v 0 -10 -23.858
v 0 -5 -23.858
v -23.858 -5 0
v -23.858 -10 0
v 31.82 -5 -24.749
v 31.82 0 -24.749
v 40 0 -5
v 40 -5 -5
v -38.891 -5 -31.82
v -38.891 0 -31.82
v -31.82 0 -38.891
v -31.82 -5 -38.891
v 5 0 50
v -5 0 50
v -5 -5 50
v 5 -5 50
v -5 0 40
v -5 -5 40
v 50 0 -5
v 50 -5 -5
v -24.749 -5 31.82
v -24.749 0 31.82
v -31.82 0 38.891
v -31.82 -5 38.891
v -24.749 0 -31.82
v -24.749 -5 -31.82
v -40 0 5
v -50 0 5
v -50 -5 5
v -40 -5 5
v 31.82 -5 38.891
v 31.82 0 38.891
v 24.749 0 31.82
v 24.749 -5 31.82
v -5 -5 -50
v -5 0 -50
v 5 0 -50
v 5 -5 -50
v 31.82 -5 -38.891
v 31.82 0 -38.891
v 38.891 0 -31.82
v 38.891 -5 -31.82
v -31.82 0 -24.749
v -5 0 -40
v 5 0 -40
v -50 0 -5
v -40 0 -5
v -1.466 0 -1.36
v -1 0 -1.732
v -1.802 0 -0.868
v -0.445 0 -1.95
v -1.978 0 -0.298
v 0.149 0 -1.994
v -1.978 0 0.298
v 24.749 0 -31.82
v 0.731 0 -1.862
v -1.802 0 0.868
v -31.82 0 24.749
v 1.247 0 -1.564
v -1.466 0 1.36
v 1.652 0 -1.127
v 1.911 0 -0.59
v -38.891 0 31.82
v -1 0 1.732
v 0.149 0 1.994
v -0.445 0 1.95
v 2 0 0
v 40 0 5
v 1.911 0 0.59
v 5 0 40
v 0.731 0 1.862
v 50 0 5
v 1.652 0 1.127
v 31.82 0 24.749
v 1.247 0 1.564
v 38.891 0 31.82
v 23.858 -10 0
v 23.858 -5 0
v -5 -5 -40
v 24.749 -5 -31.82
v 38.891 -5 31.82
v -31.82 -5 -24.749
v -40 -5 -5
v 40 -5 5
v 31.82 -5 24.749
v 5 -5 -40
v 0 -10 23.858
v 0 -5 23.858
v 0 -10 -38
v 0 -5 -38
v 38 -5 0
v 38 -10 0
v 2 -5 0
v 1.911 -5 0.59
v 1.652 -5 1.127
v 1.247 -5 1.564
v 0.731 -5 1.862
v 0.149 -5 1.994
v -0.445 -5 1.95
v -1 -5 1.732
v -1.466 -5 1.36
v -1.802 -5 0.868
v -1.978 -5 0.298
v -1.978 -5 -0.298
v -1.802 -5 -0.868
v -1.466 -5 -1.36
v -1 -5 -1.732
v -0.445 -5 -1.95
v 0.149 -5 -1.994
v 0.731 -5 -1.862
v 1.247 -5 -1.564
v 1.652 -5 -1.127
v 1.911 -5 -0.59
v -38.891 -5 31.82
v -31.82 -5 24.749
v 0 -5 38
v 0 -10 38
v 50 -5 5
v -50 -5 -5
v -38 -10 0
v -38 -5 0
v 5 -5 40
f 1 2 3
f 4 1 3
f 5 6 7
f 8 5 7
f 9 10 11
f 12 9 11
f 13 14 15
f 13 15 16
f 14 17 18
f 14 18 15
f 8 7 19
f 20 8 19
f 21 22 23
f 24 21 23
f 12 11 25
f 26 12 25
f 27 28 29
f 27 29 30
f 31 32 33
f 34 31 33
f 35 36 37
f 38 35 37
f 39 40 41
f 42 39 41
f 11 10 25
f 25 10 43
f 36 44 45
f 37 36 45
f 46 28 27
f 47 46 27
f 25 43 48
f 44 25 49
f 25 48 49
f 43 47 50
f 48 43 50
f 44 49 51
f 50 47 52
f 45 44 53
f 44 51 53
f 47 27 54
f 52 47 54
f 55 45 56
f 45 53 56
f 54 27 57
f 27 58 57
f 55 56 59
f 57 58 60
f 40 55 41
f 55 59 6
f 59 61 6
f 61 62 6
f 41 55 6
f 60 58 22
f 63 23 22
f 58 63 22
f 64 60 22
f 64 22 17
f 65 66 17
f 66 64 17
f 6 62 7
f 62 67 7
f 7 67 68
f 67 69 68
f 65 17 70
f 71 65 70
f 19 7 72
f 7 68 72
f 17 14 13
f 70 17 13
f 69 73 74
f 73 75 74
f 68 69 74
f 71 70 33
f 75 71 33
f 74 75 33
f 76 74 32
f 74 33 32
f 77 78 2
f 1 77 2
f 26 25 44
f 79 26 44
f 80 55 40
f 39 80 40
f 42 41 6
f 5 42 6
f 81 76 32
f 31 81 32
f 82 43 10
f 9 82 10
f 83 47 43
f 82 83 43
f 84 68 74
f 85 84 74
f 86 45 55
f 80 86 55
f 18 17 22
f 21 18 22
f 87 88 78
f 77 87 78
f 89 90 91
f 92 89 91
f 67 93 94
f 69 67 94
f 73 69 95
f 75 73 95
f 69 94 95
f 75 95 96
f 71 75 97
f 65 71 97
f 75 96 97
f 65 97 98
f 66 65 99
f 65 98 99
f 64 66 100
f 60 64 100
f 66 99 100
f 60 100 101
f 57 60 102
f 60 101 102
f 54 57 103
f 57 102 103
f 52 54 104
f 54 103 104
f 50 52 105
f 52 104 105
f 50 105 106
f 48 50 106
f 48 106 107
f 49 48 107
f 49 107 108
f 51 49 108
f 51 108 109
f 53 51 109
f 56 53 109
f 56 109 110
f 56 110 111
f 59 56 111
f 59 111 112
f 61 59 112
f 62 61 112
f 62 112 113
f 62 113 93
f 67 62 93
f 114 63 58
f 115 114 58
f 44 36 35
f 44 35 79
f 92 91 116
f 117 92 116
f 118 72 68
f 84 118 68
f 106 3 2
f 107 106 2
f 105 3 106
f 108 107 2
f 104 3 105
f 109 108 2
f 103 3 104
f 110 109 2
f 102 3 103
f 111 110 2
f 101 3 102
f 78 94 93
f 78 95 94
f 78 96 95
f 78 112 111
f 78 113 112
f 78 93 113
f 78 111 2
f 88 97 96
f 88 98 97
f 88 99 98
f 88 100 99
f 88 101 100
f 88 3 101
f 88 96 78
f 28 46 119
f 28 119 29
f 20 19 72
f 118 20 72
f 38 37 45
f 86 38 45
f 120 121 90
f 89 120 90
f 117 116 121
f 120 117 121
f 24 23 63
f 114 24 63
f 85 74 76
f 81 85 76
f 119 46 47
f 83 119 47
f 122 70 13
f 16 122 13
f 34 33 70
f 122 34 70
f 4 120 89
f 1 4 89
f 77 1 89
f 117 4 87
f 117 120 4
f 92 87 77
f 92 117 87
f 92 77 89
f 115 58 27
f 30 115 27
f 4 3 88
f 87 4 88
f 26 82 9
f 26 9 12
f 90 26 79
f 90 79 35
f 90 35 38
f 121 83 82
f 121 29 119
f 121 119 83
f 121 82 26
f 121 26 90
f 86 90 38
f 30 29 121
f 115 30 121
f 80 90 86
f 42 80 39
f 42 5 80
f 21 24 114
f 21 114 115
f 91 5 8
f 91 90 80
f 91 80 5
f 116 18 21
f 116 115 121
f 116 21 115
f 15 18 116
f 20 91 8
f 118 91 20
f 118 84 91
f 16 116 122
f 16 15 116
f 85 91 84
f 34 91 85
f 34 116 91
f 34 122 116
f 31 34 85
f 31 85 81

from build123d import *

# Parameters (mm, degrees)
F0_W     = 10
F0_H     = 10
F1_DEPTH = 5
F3_DEPTH = 5
F2_R     = 2
F4_DEPTH = 25


with BuildPart() as f1:
    # F0 (on Front) → F1 (new body)
    with BuildSketch(Plane.XZ):
        Polygon((-24.7487373415, -31.8198051534), (-5, -40), (-5, -12.0710678119), align=None)
        Polygon((-24.7487373415, 31.8198051534), (-5, 12.0710678119), (-5, 40), align=None)
        Polygon((5, 40), (5, 12.0710678119), (24.7487373415, 31.8198051534), align=None)
        Polygon((-31.8198051534, -38.8908729653), (-24.7487373415, -31.8198051534), (-31.8198051534, -24.7487373415), (-38.8908729653, -31.8198051534), align=None)
        Polygon((24.7487373415, 31.8198051534), (31.8198051534, 24.7487373415), (38.8908729653, 31.8198051534), (31.8198051534, 38.8908729653), align=None)
        Polygon((5, -12.0710678119), (5, -40), (24.7487373415, -31.8198051534), align=None)
        Polygon((31.8198051534, -24.7487373415), (24.7487373415, -31.8198051534), (31.8198051534, -38.8908729653), (38.8908729653, -31.8198051534), align=None)
        Polygon((-40, -5), (-31.8198051534, -24.7487373415), (-12.0710678119, -5), align=None)
        Polygon((-12.0710678119, 5), (-5, 5), (-5, 12.0710678119), (-24.7487373415, 31.8198051534), (-31.8198051534, 24.7487373415), align=None)
        Polygon((-38.8908729653, 31.8198051534), (-31.8198051534, 24.7487373415), (-24.7487373415, 31.8198051534), (-31.8198051534, 38.8908729653), align=None)
        Polygon((-31.8198051534, 24.7487373415), (-40, 5), (-12.0710678119, 5), align=None)
        with Locations((-45, 0)):
            Rectangle(F0_W, F0_H)
        Polygon((-12.0710678119, -5), (-5, -5), (-5, -2.0710678119), (-7.0710678119, 0), align=None)
        with Locations((45, 0)):
            Rectangle(F0_W, F0_H)
        Polygon((5, 2.0710678119), (5, -2.0710678119), (7.0710678119, 0), align=None)
        with Locations((0, 45)):
            Rectangle(F0_W, F0_H)
        Polygon((3.5355339059, -3.5355339059), (5, -2.0710678119), (5, 2.0710678119), (3.5355339059, 3.5355339059), (0, 0), align=None)
        Polygon((-5, -40), (5, -40), (5, -12.0710678119), (0, -7.0710678119), (-5, -12.0710678119), align=None)
        with Locations((0, -45)):
            Rectangle(F0_W, F0_H)
        Polygon((0, -7.0710678119), (5, -12.0710678119), (5, -5), (2.0710678119, -5), align=None)
        Polygon((7.0710678119, 0), (12.0710678119, -5), (40, -5), (40, 5), (12.0710678119, 5), align=None)
        Polygon((5, 5), (5, 2.0710678119), (7.0710678119, 0), (12.0710678119, 5), align=None)
        Polygon((5, -5), (5, -12.0710678119), (24.7487373415, -31.8198051534), (31.8198051534, -24.7487373415), (12.0710678119, -5), align=None)
        Polygon((-2.0710678119, -5), (0, -7.0710678119), (2.0710678119, -5), align=None)
        Polygon((5, 12.0710678119), (5, 5), (12.0710678119, 5), (31.8198051534, 24.7487373415), (24.7487373415, 31.8198051534), align=None)
        Polygon((-40, -5), (-12.0710678119, -5), (-7.0710678119, 0), (-12.0710678119, 5), (-40, 5), align=None)
        Polygon((-5, -5), (-5, -12.0710678119), (0, -7.0710678119), (-2.0710678119, -5), align=None)
        Polygon((5, -2.0710678119), (5, -5), (12.0710678119, -5), (7.0710678119, 0), align=None)
        Polygon((12.0710678119, -5), (31.8198051534, -24.7487373415), (40, -5), align=None)
        Polygon((12.0710678119, 5), (40, 5), (31.8198051534, 24.7487373415), align=None)
        Polygon((-2.0710678119, -5), (2.0710678119, -5), (3.5355339059, -3.5355339059), (0, 0), (-3.5355339059, -3.5355339059), align=None)
        Polygon((0, 7.0710678119), (5, 12.0710678119), (5, 40), (-5, 40), (-5, 12.0710678119), align=None)
        Polygon((-7.0710678119, 0), (-5, -2.0710678119), (-5, 2.0710678119), align=None)
        Polygon((-7.0710678119, 0), (-5, 2.0710678119), (-5, 5), (-12.0710678119, 5), align=None)
        Polygon((-2.0710678119, 5), (2.0710678119, 5), (0, 7.0710678119), align=None)
        Polygon((-5, 2.0710678119), (-5, -2.0710678119), (-3.5355339059, -3.5355339059), (0, 0), (-3.5355339059, 3.5355339059), align=None)
        Polygon((2.0710678119, 5), (5, 5), (5, 12.0710678119), (0, 7.0710678119), align=None)
        Polygon((-5, 12.0710678119), (-5, 5), (-2.0710678119, 5), (0, 7.0710678119), align=None)
        Polygon((-24.7487373415, -31.8198051534), (-5, -12.0710678119), (-5, -5), (-12.0710678119, -5), (-31.8198051534, -24.7487373415), align=None)
        Polygon((-3.5355339059, 3.5355339059), (0, 0), (3.5355339059, 3.5355339059), (2.0710678119, 5), (-2.0710678119, 5), align=None)
        Polygon((-5, 5), (-3.5355339059, 3.5355339059), (-2.0710678119, 5), align=None)
        Polygon((2.0710678119, -5), (5, -5), (3.5355339059, -3.5355339059), align=None)
        Polygon((-5, 5), (-5, 2.0710678119), (-3.5355339059, 3.5355339059), align=None)
        Polygon((3.5355339059, -3.5355339059), (5, -5), (5, -2.0710678119), align=None)
        Polygon((-3.5355339059, -3.5355339059), (-5, -5), (-2.0710678119, -5), align=None)
        Polygon((3.5355339059, 3.5355339059), (5, 2.0710678119), (5, 5), align=None)
        Polygon((3.5355339059, 3.5355339059), (5, 5), (2.0710678119, 5), align=None)
        Polygon((-5, -2.0710678119), (-5, -5), (-3.5355339059, -3.5355339059), align=None)
    extrude(amount=F1_DEPTH)

    # F2 (on face) → F3 (join)
    with BuildSketch(Plane.XZ.offset(5)):
        Polygon((-30.9289321881, -7.0710678119), (0, -38), (7.0710678119, -30.9289321881), (0, -23.8578643763), (-23.8578643763, 0), align=None)
        Polygon((-38, 0), (-30.9289321881, -7.0710678119), (-23.8578643763, 0), (0, 23.8578643763), (-7.0710678119, 30.9289321881), align=None)
        Polygon((0, -23.8578643763), (7.0710678119, -30.9289321881), (38, 0), (30.9289321881, 7.0710678119), (23.8578643763, 0), align=None)
        Polygon((0, 38), (-7.0710678119, 30.9289321881), (0, 23.8578643763), (23.8578643763, 0), (30.9289321881, 7.0710678119), align=None)
    extrude(amount=F3_DEPTH)

    # F2 (on face) → F4 (cut)
    with BuildSketch(Plane.XZ.offset(5)):
        Circle(F2_R)
    extrude(amount=-F4_DEPTH, mode=Mode.SUBTRACT)


solid = f1.part
